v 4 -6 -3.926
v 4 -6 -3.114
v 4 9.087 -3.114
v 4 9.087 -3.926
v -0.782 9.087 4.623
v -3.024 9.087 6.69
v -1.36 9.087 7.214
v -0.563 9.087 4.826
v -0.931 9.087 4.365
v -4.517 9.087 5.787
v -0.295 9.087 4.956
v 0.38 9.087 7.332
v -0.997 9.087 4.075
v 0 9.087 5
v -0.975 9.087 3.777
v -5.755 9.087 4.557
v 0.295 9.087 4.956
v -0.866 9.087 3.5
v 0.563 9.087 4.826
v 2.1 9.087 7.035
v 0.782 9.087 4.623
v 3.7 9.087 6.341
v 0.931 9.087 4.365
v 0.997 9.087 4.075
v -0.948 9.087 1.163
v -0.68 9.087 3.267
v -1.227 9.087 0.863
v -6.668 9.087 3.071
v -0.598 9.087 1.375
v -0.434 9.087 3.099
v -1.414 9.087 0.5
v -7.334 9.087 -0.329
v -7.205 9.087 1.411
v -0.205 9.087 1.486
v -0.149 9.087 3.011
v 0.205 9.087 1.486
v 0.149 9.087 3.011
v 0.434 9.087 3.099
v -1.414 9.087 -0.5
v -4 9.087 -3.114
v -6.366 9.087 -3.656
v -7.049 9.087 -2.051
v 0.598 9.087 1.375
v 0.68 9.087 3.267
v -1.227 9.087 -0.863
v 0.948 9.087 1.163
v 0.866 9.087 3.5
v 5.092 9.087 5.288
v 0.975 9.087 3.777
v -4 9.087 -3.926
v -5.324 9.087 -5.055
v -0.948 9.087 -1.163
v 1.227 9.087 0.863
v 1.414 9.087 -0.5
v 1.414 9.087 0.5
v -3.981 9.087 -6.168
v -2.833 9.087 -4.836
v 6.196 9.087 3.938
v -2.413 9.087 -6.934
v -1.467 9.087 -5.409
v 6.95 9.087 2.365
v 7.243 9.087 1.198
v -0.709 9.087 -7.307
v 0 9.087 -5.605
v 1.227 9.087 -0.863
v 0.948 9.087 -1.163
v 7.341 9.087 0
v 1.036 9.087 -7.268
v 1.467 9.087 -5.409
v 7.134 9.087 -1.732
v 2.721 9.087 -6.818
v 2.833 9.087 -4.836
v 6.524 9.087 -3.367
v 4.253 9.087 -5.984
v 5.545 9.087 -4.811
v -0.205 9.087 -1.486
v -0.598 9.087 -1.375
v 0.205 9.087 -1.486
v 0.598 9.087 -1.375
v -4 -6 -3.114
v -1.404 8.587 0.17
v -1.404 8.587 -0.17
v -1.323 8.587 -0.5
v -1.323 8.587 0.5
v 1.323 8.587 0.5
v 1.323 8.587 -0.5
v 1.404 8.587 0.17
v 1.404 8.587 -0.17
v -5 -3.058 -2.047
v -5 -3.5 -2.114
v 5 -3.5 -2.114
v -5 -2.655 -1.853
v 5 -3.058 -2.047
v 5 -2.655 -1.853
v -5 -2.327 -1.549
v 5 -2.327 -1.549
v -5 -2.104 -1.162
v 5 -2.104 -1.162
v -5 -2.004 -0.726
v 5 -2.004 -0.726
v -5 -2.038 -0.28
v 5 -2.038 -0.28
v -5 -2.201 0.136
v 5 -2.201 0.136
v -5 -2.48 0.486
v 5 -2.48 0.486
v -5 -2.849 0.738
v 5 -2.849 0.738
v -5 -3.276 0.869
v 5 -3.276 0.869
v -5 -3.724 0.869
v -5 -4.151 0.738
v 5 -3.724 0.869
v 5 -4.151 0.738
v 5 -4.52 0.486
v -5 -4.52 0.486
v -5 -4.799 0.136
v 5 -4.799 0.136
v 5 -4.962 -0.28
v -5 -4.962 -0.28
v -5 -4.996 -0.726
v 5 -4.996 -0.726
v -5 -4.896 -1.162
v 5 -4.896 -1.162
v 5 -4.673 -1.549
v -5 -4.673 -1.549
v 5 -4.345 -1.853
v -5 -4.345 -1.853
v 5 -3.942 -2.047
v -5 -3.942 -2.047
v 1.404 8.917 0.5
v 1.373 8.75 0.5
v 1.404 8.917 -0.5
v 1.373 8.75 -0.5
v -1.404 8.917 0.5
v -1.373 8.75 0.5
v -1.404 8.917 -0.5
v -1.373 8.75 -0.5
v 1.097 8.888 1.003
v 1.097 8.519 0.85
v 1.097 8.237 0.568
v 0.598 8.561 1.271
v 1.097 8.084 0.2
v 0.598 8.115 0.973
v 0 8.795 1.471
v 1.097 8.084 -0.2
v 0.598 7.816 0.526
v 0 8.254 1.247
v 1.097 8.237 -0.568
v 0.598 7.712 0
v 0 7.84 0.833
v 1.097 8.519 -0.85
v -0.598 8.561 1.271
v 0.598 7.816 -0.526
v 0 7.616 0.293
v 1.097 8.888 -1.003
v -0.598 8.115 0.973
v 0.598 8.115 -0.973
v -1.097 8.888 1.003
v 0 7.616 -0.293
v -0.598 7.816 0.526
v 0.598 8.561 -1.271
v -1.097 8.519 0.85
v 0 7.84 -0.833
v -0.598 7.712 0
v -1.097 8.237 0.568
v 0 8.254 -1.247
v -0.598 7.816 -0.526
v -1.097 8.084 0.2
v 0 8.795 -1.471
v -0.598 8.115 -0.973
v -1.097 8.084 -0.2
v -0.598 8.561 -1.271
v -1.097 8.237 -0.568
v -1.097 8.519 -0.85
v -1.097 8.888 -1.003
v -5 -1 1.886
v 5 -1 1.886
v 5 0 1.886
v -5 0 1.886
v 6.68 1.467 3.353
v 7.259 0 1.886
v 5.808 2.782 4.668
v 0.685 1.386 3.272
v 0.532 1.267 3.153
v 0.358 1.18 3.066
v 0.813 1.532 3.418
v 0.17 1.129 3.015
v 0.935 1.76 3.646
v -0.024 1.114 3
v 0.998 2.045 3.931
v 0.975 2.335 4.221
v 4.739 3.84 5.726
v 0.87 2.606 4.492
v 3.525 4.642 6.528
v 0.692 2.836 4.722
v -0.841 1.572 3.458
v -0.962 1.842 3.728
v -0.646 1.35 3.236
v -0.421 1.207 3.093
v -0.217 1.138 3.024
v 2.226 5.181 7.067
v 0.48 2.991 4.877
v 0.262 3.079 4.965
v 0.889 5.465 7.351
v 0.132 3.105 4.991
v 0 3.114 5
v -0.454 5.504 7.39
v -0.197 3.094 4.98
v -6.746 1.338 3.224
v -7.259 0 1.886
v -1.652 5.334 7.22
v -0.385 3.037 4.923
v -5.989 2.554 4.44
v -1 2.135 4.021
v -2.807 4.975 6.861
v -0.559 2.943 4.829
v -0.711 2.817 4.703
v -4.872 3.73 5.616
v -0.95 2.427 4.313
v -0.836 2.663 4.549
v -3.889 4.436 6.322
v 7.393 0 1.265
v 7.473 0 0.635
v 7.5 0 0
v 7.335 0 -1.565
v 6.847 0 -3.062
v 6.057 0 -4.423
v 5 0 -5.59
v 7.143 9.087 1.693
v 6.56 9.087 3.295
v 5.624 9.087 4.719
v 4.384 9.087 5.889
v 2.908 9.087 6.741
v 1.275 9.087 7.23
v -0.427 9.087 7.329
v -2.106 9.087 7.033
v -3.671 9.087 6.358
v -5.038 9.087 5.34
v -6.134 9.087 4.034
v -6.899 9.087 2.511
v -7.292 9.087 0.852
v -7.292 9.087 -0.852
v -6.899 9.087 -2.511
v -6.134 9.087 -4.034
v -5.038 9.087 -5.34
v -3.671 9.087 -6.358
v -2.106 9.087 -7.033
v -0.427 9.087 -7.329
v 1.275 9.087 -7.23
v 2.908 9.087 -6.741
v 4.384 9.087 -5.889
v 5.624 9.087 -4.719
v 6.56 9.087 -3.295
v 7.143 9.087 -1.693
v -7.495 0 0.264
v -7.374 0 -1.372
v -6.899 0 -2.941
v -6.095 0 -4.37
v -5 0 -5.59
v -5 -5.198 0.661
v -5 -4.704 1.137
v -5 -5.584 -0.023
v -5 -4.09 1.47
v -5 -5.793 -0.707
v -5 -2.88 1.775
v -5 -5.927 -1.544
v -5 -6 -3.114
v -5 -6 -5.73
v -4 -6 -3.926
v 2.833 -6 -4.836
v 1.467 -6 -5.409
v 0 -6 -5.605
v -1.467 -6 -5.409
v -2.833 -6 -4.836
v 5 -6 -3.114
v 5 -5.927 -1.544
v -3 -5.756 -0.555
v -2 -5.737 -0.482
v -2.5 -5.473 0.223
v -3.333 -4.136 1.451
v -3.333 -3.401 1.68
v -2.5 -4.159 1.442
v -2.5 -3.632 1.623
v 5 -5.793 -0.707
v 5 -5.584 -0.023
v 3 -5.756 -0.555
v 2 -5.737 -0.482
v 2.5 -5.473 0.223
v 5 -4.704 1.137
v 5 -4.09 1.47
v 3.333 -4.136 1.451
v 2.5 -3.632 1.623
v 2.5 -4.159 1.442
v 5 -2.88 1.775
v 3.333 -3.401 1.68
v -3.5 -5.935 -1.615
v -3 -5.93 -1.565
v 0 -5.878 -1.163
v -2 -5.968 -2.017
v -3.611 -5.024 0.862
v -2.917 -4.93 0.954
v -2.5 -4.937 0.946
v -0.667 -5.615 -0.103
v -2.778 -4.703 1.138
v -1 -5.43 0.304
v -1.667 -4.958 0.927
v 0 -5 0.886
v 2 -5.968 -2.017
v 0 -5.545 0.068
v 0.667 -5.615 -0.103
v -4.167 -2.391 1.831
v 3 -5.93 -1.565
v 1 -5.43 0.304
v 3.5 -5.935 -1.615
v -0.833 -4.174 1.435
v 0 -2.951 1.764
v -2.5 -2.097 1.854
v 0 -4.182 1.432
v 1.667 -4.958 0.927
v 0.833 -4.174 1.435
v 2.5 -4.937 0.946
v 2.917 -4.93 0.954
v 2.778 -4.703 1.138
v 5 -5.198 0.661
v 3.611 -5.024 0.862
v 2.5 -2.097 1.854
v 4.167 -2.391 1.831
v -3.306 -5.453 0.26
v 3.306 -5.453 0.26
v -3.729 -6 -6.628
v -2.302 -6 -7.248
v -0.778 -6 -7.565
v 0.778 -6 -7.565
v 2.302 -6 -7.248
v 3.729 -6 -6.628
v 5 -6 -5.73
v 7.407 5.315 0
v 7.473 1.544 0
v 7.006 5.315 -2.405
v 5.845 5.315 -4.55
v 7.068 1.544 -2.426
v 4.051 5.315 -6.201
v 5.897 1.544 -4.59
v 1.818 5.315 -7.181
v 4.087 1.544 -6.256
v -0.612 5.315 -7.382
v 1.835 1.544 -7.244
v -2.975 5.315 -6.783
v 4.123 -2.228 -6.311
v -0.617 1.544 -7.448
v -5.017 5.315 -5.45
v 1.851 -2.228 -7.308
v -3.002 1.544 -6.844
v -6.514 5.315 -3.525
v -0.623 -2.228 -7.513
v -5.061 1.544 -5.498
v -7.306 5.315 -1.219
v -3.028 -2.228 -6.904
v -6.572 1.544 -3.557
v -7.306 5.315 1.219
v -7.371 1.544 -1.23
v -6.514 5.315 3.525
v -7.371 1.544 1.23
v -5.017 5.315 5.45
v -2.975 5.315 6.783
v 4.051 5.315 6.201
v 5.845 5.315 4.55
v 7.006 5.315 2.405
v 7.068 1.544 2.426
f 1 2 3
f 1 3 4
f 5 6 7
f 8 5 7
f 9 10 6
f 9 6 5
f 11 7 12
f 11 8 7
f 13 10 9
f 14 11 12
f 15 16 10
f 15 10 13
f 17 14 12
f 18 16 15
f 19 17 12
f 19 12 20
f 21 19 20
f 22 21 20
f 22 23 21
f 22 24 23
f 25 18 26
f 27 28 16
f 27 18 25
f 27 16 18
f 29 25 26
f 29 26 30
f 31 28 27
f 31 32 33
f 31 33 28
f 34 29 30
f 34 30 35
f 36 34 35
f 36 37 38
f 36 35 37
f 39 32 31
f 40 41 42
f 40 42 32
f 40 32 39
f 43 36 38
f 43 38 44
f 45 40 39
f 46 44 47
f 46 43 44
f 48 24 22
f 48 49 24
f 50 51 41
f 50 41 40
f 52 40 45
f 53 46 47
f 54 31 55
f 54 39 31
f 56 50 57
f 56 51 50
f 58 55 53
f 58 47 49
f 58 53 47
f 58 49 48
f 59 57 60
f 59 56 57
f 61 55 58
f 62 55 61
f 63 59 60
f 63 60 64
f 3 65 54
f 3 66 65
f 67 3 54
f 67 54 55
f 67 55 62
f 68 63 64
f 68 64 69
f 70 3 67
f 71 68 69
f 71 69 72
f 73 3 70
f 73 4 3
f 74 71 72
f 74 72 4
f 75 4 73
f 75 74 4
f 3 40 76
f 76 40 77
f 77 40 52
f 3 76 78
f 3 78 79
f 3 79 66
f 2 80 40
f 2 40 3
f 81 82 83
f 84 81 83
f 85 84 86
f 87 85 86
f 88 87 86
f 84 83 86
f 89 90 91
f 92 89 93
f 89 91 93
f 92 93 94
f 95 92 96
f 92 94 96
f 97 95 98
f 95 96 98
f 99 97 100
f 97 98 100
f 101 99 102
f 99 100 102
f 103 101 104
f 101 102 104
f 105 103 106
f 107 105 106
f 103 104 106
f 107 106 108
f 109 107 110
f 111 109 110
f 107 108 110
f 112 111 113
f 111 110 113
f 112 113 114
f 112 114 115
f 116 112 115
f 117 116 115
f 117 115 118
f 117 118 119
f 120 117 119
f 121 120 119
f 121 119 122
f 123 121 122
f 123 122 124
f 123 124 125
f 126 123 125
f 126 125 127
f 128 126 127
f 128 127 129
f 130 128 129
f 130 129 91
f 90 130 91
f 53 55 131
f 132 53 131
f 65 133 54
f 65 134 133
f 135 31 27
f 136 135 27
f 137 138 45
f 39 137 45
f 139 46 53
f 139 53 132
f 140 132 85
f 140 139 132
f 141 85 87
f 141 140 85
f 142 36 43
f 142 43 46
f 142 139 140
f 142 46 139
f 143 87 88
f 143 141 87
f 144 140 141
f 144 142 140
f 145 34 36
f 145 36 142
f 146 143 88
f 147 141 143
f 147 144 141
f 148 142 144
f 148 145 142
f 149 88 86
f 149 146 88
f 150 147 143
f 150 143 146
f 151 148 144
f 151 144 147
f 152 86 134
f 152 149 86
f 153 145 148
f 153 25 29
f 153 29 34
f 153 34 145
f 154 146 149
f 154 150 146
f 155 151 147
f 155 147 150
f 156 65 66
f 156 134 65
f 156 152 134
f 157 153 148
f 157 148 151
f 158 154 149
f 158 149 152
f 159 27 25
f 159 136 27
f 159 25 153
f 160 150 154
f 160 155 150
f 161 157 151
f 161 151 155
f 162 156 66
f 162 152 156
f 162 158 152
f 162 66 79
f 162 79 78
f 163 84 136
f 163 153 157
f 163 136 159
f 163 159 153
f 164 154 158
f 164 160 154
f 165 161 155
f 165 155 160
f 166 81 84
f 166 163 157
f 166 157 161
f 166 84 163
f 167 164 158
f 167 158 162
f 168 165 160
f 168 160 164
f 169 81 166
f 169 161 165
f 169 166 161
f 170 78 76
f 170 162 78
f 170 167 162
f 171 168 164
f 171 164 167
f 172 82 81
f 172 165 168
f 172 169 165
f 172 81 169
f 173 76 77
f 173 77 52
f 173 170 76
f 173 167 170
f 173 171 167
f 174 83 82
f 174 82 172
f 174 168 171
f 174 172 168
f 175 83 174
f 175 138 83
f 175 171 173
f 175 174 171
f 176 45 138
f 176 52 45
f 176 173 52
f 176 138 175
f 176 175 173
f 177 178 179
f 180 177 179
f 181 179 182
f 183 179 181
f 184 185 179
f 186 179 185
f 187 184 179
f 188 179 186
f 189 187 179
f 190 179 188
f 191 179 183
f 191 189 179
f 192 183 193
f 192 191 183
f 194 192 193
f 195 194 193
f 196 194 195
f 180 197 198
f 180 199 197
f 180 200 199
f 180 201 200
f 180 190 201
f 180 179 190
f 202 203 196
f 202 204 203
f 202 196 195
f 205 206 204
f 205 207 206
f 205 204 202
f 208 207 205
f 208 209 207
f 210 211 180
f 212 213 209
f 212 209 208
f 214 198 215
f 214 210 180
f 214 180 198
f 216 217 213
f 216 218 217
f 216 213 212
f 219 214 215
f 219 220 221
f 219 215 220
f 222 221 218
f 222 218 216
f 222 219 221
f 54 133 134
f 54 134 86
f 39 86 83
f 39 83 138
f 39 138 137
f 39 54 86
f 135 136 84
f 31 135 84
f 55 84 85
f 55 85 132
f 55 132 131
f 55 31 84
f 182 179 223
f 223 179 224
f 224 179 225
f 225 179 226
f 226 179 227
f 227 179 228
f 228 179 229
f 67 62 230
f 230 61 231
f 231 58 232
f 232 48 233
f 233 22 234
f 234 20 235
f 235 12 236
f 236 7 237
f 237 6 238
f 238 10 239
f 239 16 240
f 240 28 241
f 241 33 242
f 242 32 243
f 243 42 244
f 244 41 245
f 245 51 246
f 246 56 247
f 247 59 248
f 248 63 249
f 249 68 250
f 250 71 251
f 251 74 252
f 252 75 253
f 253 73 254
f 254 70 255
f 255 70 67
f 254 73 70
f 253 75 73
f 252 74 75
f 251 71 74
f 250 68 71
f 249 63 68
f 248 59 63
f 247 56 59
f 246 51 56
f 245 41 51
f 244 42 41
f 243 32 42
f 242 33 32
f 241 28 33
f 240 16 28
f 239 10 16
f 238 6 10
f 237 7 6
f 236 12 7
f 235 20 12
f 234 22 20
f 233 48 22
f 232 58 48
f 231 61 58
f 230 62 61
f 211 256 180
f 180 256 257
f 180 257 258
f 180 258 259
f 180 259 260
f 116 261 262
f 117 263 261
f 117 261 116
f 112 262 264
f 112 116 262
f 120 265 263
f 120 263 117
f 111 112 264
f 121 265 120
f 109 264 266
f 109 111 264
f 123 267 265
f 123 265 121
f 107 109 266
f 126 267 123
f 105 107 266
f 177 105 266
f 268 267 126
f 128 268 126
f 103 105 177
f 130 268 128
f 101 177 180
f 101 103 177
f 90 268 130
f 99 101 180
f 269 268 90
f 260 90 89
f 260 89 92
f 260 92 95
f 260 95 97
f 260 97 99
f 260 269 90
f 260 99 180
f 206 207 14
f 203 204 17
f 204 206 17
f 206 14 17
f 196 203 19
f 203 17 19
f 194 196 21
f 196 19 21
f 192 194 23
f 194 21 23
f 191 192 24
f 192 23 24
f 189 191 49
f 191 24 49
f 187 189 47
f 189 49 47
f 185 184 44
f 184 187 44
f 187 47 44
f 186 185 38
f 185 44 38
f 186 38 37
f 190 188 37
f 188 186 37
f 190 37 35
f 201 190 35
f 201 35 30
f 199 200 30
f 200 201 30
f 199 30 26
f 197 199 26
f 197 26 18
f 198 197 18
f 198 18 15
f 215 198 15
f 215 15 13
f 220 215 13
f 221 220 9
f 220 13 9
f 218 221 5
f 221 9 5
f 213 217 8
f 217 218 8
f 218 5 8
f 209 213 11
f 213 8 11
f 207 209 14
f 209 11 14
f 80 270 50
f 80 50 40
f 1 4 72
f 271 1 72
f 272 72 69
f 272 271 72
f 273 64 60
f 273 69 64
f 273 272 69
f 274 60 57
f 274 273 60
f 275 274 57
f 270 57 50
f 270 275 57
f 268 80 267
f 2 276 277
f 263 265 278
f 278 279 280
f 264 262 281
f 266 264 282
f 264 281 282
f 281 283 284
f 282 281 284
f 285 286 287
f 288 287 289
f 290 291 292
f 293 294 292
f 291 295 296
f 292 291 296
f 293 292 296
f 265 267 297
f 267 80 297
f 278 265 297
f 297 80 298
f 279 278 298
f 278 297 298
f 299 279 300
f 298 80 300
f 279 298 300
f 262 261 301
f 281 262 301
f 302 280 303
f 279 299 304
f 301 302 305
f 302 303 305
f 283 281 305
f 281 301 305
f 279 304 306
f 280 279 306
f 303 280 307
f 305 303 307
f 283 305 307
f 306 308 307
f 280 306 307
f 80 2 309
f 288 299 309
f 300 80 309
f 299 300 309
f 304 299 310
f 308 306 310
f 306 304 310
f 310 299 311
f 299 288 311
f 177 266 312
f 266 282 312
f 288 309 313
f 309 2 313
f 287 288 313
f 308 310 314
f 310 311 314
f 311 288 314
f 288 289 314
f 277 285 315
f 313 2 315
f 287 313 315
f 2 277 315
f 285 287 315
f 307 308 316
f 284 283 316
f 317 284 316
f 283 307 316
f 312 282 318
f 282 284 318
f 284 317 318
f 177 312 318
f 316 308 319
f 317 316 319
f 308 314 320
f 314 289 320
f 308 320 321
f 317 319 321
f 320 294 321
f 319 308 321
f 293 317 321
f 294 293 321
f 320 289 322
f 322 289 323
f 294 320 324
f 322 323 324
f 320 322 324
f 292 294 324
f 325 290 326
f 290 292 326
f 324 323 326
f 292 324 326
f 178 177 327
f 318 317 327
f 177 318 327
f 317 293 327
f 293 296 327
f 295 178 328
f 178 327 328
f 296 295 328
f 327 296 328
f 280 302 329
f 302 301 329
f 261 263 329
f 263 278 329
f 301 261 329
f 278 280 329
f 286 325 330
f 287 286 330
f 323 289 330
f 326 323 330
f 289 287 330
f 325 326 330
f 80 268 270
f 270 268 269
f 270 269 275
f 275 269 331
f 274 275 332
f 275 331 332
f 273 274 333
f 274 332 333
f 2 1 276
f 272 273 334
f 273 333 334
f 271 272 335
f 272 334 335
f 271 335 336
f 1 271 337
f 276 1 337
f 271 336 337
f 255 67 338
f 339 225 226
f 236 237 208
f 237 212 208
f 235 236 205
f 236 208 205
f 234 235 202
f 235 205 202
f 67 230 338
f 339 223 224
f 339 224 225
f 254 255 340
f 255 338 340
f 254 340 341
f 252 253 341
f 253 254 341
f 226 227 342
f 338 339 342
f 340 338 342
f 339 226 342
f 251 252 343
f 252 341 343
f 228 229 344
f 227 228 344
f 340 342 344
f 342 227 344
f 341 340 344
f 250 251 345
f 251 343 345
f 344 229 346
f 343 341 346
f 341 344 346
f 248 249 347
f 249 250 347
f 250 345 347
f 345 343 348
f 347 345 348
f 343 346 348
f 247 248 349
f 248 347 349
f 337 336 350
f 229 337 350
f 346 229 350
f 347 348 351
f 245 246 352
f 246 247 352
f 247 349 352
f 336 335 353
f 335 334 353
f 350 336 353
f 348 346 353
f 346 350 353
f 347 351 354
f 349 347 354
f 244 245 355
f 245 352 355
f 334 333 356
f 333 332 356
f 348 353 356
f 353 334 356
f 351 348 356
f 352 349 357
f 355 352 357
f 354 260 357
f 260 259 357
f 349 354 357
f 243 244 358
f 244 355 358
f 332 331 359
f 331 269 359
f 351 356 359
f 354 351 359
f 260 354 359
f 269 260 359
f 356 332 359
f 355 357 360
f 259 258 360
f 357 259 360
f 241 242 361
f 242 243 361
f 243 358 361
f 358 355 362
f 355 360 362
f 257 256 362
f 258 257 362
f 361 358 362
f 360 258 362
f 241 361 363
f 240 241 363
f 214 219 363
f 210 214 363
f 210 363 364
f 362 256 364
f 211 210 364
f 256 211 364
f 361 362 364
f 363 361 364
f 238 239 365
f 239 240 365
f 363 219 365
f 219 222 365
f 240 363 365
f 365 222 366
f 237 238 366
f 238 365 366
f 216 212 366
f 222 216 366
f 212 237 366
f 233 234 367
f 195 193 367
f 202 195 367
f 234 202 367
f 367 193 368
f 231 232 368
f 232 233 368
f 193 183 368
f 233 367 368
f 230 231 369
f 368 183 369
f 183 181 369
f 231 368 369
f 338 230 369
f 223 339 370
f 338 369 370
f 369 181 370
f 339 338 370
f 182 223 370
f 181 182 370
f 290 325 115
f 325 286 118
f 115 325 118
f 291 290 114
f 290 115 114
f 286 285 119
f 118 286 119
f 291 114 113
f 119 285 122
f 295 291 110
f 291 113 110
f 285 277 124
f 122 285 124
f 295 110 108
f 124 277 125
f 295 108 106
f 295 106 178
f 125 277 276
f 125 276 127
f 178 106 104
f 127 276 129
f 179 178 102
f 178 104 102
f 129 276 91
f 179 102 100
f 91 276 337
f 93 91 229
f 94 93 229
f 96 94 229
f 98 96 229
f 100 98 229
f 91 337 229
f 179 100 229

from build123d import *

# Parameters (mm, degrees)
SKETCH1_R                     = 7.5
BOSS_EXTRUDE1_DEPTH           = 19
BOSS_EXTRUDE1_TAPER           = 1
BOSS_EXTRUDE1_OTHER_WAY_DEPTH = 6
BOSS_EXTRUDE1_OTHER_WAY_TAPER = -1
CUT_EXTRUDE1_DEPTH            = 22.832632654
CUT_EXTRUDE1_DEPTH_BACK       = 22.832632654
CUT_EXTRUDE2_START            = -9.490788257
CUT_EXTRUDE2_OUTLINE_W        = 6.502745185
CUT_EXTRUDE2_OUTLINE_H        = 6
CUT_EXTRUDE2_DEPTH            = 9.490788257
SKETCH5_R                     = 1.5
CUT_EXTRUDE3_DEPTH            = 24.980865958
FILLET1_SIZE                  = 5
CUT_EXTRUDE4_DEPTH            = 22.796374265
CUT_EXTRUDE4_DEPTH_BACK       = 22.796374265
SKETCH6_W                     = 18.67842866
SKETCH6_H                     = 10.912736301
CUT_EXTRUDE5_DEPTH            = 19.48533084
SKETCH8_R                     = 1
CUT_EXTRUDE6_DEPTH            = 10
BOSS_EXTRUDE2_DEPTH           = 0.5


with BuildPart() as part:
    # Sketch1 → Boss-Extrude1 (new body)
    with BuildSketch(Plane(origin=(0, 0, 0), x_dir=(1, 0, 0), z_dir=(0, 1, 0))):
        Circle(SKETCH1_R)
    extrude(amount=BOSS_EXTRUDE1_DEPTH, taper=BOSS_EXTRUDE1_TAPER)

    # Sketch1 → Boss-Extrude1 other way (add)
    with BuildSketch(Plane(origin=(0, 0, 0), x_dir=(1, 0, 0), z_dir=(0, 1, 0))):
        Circle(SKETCH1_R)
    extrude(amount=-BOSS_EXTRUDE1_OTHER_WAY_DEPTH, taper=BOSS_EXTRUDE1_OTHER_WAY_TAPER)

    # Sketch3 → Cut-Extrude1 (cut, two sides: drawn at the far end of the back side and taken through both)
    with BuildSketch(Plane(origin=(0, 0, 0), x_dir=(0, 0, -1), z_dir=(1, 0, 0)).offset(-CUT_EXTRUDE1_DEPTH_BACK)):
        Polygon((-1.886057768, -6), (-1.886057768, 0), (-9.929766736, 8.043708969), (-9.929766736, -6), align=None)
    extrude(amount=CUT_EXTRUDE1_DEPTH + CUT_EXTRUDE1_DEPTH_BACK, mode=Mode.SUBTRACT)

    # Cut-Extrude2: read off the stored shape, not the designer's step
    # Cut-Extrude2 outline → Cut-Extrude2 (cut)
    with BuildSketch(Plane.XY.offset(1.886057768).offset(CUT_EXTRUDE2_START)):
        with Locations((-8.251372593, -3)):
            Rectangle(CUT_EXTRUDE2_OUTLINE_W, CUT_EXTRUDE2_OUTLINE_H)
        with Locations((8.251372593, -3)):
            Rectangle(CUT_EXTRUDE2_OUTLINE_W, CUT_EXTRUDE2_OUTLINE_H)
    extrude(amount=CUT_EXTRUDE2_DEPTH, mode=Mode.SUBTRACT)

    # Sketch5 → Cut-Extrude3 (cut, through all)
    with BuildSketch(Plane(origin=(5, 0, 0), x_dir=(0, 0, -1), z_dir=(1, 0, 0))):
        with Locations((0.613942232, -3.5)):
            Circle(SKETCH5_R)
    extrude(amount=-CUT_EXTRUDE3_DEPTH, mode=Mode.SUBTRACT)

    # Fillet1
    # a fillet whose section is not a circle: 5 mm, written as the material it takes off along each edge
    with BuildSketch(Plane(origin=(17.5, -6, 1.886057768), x_dir=(0, 0, -1), z_dir=(-1, 0, 0))) as fillet1_piece_1:
        with BuildLine():
            Bezier((FILLET1_SIZE, 0), (0, 0), (0, -FILLET1_SIZE), weights=[1, 1.5, 1])
            Line((0, -FILLET1_SIZE), (0, 0))
            Line((0, 0), (FILLET1_SIZE, 0))
        make_face()
    extrude(amount=35, mode=Mode.SUBTRACT)

    # Fillet2
    # a fillet whose section is not a circle: 10, 5 mm, written as the material it takes off along each edge
    with BuildSketch(Plane(origin=(0, 19, 0), x_dir=(1, 0, 0), z_dir=(0, 0, -1))) as fillet2_piece_1:
        with BuildLine():
            Bezier((7.341381251, 9.912737968), (7.168353766, 0), (2.342142775, 0), weights=[1, 0.818181818, 1])
            Line((2.342142775, 0), (7.168353766, 0))
            Line((7.168353766, 0), (7.341381251, 9.912737968))
        make_face()
    revolve(axis=Axis((0, 19, 0), (0, -1, 0)), mode=Mode.SUBTRACT)

    # Sketch6 → Cut-Extrude4 (cut, two sides: drawn at the far end of the back side and taken through both)
    with BuildSketch(Plane(origin=(0, 0, 0), x_dir=(0, 0, -1), z_dir=(1, 0, 0)).offset(-CUT_EXTRUDE4_DEPTH_BACK)):
        with Locations((-1.153671222, 14.54363185)):
            Rectangle(SKETCH6_W, SKETCH6_H)
    extrude(amount=CUT_EXTRUDE4_DEPTH + CUT_EXTRUDE4_DEPTH_BACK, mode=Mode.SUBTRACT)

    # Sketch7 → Cut-Extrude5 (cut, through all)
    with BuildSketch(Plane.XZ.offset(6)):
        with BuildLine():
            Line((4, -3.113942232), (4, -3.925939727))
            ThreePointArc((4, -3.925939727), (0, -5.60473039), (-4, -3.925939727))
            Line((-4, -3.925939727), (-4, -3.113942232))
            Line((-4, -3.113942232), (4, -3.113942232))
        make_face()
    extrude(amount=-CUT_EXTRUDE5_DEPTH, mode=Mode.SUBTRACT)

    # Sketch8 → Cut-Extrude6 (cut)
    with BuildSketch(Plane(origin=(0, 9.087263699, 0), x_dir=(1, 0, 0), z_dir=(0, 1, 0))):
        with Locations(Location((0, -4, 0), (0, 0, 270))):
            Circle(SKETCH8_R)
    extrude(amount=-CUT_EXTRUDE6_DEPTH, mode=Mode.SUBTRACT)

    # Sketch9 → Cut-Revolve1 (revolve, cut)
    with BuildSketch(Plane(origin=(0, 9.087263699, 0), x_dir=(1, 0, 0), z_dir=(0, 1, 0))):
        with BuildLine():
            Line((-1.5, 0), (1.5, 0))
            ThreePointArc((1.5, 0), (0, 1.5), (-1.5, 0))
        make_face()
    revolve(axis=Axis((-1.5, 9.087263699, 0), (1, 0, 0)), mode=Mode.SUBTRACT)

    # Sketch10 → Boss-Extrude2 (add)
    with BuildSketch(Plane(origin=(0, 9.087263699, 0), x_dir=(1, 0, 0), z_dir=(0, 1, 0))):
        with BuildLine():
            ThreePointArc((-1.414213562, 0.5), (-1.5, 0), (-1.414213562, -0.5))
            Line((-1.414213562, -0.5), (1.414213562, -0.5))
            ThreePointArc((1.414213562, -0.5), (1.478397839, -0.253652968), (1.5, 0))
            ThreePointArc((1.5, 0), (1.478397839, 0.253652968), (1.414213562, 0.5))
            Line((1.414213562, 0.5), (-1.414213562, 0.5))
        make_face()
    extrude(amount=-BOSS_EXTRUDE2_DEPTH)


solid = part.part
